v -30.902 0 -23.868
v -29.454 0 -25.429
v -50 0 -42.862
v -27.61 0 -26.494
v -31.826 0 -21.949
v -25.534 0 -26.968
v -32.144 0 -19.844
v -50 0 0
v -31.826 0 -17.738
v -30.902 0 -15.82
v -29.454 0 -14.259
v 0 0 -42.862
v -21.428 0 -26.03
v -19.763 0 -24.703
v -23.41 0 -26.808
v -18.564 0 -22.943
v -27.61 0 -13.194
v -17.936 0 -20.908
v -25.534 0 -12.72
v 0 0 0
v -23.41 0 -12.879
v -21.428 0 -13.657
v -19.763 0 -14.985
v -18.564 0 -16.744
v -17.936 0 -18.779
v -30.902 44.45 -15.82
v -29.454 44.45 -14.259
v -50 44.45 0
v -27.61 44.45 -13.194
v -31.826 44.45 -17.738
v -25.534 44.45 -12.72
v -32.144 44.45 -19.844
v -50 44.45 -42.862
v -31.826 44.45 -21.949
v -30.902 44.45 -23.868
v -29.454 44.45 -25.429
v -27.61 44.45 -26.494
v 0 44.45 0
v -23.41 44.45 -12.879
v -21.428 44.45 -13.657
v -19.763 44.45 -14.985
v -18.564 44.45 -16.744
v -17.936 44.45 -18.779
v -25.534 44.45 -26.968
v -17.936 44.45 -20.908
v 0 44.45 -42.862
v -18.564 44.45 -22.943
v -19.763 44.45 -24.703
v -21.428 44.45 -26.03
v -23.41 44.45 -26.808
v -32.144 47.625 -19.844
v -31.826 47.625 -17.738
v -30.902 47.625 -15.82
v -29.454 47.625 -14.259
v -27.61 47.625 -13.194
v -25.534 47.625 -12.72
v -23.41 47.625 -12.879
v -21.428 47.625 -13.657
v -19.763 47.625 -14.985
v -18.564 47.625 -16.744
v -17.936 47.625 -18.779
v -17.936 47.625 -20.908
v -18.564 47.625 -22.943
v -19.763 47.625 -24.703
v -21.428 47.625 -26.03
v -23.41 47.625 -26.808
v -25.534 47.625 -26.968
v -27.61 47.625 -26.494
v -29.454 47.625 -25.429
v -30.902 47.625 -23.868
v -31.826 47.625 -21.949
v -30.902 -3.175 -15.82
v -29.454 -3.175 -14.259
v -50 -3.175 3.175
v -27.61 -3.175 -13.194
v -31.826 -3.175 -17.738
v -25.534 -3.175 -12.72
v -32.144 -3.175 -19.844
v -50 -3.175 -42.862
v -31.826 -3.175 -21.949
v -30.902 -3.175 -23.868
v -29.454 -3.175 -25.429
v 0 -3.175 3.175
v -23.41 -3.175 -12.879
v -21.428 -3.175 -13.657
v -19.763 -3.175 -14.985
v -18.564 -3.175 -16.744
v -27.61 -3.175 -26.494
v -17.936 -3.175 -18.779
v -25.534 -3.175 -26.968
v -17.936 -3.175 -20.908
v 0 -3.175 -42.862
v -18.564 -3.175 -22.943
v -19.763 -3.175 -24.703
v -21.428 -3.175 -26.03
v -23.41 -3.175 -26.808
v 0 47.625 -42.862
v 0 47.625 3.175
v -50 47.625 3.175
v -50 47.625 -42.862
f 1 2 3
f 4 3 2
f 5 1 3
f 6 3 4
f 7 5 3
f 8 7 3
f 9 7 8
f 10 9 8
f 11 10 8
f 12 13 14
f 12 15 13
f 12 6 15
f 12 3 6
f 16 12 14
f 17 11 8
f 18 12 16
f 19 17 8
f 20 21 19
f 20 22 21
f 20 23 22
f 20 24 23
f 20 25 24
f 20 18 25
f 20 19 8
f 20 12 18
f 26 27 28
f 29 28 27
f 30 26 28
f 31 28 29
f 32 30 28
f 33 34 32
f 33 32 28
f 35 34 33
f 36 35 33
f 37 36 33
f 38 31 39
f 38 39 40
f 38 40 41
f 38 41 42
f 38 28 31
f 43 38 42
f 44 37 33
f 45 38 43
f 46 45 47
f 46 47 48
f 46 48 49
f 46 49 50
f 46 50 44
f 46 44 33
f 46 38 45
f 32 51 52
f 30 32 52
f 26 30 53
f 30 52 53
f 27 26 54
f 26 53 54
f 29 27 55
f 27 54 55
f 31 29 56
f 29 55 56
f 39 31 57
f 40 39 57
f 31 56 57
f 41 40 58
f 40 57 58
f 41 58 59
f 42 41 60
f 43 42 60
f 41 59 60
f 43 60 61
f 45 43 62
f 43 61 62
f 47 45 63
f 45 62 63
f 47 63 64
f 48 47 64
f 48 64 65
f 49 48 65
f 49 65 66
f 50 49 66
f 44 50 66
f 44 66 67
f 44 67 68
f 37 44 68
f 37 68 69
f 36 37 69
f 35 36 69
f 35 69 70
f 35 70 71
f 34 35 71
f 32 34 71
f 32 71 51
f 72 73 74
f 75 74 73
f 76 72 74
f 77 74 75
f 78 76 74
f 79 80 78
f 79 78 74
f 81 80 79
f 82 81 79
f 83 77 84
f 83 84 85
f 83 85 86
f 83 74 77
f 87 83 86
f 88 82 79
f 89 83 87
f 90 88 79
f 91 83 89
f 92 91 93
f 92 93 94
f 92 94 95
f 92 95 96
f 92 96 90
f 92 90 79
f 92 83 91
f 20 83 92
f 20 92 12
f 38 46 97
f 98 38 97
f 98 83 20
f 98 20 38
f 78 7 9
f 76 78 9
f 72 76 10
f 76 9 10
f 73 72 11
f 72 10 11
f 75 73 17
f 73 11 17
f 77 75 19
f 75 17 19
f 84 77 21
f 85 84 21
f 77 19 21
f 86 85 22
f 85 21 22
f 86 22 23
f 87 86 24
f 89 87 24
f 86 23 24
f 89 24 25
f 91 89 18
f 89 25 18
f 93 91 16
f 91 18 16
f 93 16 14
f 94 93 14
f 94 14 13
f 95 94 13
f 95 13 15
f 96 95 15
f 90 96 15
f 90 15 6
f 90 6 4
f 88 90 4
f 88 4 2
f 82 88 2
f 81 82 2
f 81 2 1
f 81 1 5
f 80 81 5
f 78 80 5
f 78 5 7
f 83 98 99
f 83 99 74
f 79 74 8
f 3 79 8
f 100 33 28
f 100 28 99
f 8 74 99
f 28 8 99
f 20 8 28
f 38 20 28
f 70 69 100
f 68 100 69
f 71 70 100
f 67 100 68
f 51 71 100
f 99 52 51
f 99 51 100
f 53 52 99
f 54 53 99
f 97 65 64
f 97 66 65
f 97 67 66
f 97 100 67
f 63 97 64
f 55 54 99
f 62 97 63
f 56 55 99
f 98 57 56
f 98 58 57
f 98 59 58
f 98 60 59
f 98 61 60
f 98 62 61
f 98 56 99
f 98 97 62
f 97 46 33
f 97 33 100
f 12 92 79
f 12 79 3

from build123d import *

# Parameters (mm, degrees)
F1_DEPTH = 50
F2_R     = 7.14375
F3_DEPTH = 50.801


with BuildPart() as f1:
    # F0 (on Right) → F1 (new body)
    with BuildSketch(Plane.YZ):
        Polygon((0, -42.8625), (0, 0), (44.45, 0), (44.45, -42.8625), (47.625, -42.8625), (47.625, 3.175), (-3.175, 3.175), (-3.175, -42.8625), align=None)
    extrude(amount=-F1_DEPTH)

    # F2 (on face) → F3 (cut, through all)
    with BuildSketch(Plane(origin=(0, 47.625, 0), x_dir=(-1, 0, 0), z_dir=(0, 1, 0))):
        with Locations((25, -19.84375)):
            Circle(F2_R)
    extrude(amount=-F3_DEPTH, mode=Mode.SUBTRACT)


solid = f1.part
